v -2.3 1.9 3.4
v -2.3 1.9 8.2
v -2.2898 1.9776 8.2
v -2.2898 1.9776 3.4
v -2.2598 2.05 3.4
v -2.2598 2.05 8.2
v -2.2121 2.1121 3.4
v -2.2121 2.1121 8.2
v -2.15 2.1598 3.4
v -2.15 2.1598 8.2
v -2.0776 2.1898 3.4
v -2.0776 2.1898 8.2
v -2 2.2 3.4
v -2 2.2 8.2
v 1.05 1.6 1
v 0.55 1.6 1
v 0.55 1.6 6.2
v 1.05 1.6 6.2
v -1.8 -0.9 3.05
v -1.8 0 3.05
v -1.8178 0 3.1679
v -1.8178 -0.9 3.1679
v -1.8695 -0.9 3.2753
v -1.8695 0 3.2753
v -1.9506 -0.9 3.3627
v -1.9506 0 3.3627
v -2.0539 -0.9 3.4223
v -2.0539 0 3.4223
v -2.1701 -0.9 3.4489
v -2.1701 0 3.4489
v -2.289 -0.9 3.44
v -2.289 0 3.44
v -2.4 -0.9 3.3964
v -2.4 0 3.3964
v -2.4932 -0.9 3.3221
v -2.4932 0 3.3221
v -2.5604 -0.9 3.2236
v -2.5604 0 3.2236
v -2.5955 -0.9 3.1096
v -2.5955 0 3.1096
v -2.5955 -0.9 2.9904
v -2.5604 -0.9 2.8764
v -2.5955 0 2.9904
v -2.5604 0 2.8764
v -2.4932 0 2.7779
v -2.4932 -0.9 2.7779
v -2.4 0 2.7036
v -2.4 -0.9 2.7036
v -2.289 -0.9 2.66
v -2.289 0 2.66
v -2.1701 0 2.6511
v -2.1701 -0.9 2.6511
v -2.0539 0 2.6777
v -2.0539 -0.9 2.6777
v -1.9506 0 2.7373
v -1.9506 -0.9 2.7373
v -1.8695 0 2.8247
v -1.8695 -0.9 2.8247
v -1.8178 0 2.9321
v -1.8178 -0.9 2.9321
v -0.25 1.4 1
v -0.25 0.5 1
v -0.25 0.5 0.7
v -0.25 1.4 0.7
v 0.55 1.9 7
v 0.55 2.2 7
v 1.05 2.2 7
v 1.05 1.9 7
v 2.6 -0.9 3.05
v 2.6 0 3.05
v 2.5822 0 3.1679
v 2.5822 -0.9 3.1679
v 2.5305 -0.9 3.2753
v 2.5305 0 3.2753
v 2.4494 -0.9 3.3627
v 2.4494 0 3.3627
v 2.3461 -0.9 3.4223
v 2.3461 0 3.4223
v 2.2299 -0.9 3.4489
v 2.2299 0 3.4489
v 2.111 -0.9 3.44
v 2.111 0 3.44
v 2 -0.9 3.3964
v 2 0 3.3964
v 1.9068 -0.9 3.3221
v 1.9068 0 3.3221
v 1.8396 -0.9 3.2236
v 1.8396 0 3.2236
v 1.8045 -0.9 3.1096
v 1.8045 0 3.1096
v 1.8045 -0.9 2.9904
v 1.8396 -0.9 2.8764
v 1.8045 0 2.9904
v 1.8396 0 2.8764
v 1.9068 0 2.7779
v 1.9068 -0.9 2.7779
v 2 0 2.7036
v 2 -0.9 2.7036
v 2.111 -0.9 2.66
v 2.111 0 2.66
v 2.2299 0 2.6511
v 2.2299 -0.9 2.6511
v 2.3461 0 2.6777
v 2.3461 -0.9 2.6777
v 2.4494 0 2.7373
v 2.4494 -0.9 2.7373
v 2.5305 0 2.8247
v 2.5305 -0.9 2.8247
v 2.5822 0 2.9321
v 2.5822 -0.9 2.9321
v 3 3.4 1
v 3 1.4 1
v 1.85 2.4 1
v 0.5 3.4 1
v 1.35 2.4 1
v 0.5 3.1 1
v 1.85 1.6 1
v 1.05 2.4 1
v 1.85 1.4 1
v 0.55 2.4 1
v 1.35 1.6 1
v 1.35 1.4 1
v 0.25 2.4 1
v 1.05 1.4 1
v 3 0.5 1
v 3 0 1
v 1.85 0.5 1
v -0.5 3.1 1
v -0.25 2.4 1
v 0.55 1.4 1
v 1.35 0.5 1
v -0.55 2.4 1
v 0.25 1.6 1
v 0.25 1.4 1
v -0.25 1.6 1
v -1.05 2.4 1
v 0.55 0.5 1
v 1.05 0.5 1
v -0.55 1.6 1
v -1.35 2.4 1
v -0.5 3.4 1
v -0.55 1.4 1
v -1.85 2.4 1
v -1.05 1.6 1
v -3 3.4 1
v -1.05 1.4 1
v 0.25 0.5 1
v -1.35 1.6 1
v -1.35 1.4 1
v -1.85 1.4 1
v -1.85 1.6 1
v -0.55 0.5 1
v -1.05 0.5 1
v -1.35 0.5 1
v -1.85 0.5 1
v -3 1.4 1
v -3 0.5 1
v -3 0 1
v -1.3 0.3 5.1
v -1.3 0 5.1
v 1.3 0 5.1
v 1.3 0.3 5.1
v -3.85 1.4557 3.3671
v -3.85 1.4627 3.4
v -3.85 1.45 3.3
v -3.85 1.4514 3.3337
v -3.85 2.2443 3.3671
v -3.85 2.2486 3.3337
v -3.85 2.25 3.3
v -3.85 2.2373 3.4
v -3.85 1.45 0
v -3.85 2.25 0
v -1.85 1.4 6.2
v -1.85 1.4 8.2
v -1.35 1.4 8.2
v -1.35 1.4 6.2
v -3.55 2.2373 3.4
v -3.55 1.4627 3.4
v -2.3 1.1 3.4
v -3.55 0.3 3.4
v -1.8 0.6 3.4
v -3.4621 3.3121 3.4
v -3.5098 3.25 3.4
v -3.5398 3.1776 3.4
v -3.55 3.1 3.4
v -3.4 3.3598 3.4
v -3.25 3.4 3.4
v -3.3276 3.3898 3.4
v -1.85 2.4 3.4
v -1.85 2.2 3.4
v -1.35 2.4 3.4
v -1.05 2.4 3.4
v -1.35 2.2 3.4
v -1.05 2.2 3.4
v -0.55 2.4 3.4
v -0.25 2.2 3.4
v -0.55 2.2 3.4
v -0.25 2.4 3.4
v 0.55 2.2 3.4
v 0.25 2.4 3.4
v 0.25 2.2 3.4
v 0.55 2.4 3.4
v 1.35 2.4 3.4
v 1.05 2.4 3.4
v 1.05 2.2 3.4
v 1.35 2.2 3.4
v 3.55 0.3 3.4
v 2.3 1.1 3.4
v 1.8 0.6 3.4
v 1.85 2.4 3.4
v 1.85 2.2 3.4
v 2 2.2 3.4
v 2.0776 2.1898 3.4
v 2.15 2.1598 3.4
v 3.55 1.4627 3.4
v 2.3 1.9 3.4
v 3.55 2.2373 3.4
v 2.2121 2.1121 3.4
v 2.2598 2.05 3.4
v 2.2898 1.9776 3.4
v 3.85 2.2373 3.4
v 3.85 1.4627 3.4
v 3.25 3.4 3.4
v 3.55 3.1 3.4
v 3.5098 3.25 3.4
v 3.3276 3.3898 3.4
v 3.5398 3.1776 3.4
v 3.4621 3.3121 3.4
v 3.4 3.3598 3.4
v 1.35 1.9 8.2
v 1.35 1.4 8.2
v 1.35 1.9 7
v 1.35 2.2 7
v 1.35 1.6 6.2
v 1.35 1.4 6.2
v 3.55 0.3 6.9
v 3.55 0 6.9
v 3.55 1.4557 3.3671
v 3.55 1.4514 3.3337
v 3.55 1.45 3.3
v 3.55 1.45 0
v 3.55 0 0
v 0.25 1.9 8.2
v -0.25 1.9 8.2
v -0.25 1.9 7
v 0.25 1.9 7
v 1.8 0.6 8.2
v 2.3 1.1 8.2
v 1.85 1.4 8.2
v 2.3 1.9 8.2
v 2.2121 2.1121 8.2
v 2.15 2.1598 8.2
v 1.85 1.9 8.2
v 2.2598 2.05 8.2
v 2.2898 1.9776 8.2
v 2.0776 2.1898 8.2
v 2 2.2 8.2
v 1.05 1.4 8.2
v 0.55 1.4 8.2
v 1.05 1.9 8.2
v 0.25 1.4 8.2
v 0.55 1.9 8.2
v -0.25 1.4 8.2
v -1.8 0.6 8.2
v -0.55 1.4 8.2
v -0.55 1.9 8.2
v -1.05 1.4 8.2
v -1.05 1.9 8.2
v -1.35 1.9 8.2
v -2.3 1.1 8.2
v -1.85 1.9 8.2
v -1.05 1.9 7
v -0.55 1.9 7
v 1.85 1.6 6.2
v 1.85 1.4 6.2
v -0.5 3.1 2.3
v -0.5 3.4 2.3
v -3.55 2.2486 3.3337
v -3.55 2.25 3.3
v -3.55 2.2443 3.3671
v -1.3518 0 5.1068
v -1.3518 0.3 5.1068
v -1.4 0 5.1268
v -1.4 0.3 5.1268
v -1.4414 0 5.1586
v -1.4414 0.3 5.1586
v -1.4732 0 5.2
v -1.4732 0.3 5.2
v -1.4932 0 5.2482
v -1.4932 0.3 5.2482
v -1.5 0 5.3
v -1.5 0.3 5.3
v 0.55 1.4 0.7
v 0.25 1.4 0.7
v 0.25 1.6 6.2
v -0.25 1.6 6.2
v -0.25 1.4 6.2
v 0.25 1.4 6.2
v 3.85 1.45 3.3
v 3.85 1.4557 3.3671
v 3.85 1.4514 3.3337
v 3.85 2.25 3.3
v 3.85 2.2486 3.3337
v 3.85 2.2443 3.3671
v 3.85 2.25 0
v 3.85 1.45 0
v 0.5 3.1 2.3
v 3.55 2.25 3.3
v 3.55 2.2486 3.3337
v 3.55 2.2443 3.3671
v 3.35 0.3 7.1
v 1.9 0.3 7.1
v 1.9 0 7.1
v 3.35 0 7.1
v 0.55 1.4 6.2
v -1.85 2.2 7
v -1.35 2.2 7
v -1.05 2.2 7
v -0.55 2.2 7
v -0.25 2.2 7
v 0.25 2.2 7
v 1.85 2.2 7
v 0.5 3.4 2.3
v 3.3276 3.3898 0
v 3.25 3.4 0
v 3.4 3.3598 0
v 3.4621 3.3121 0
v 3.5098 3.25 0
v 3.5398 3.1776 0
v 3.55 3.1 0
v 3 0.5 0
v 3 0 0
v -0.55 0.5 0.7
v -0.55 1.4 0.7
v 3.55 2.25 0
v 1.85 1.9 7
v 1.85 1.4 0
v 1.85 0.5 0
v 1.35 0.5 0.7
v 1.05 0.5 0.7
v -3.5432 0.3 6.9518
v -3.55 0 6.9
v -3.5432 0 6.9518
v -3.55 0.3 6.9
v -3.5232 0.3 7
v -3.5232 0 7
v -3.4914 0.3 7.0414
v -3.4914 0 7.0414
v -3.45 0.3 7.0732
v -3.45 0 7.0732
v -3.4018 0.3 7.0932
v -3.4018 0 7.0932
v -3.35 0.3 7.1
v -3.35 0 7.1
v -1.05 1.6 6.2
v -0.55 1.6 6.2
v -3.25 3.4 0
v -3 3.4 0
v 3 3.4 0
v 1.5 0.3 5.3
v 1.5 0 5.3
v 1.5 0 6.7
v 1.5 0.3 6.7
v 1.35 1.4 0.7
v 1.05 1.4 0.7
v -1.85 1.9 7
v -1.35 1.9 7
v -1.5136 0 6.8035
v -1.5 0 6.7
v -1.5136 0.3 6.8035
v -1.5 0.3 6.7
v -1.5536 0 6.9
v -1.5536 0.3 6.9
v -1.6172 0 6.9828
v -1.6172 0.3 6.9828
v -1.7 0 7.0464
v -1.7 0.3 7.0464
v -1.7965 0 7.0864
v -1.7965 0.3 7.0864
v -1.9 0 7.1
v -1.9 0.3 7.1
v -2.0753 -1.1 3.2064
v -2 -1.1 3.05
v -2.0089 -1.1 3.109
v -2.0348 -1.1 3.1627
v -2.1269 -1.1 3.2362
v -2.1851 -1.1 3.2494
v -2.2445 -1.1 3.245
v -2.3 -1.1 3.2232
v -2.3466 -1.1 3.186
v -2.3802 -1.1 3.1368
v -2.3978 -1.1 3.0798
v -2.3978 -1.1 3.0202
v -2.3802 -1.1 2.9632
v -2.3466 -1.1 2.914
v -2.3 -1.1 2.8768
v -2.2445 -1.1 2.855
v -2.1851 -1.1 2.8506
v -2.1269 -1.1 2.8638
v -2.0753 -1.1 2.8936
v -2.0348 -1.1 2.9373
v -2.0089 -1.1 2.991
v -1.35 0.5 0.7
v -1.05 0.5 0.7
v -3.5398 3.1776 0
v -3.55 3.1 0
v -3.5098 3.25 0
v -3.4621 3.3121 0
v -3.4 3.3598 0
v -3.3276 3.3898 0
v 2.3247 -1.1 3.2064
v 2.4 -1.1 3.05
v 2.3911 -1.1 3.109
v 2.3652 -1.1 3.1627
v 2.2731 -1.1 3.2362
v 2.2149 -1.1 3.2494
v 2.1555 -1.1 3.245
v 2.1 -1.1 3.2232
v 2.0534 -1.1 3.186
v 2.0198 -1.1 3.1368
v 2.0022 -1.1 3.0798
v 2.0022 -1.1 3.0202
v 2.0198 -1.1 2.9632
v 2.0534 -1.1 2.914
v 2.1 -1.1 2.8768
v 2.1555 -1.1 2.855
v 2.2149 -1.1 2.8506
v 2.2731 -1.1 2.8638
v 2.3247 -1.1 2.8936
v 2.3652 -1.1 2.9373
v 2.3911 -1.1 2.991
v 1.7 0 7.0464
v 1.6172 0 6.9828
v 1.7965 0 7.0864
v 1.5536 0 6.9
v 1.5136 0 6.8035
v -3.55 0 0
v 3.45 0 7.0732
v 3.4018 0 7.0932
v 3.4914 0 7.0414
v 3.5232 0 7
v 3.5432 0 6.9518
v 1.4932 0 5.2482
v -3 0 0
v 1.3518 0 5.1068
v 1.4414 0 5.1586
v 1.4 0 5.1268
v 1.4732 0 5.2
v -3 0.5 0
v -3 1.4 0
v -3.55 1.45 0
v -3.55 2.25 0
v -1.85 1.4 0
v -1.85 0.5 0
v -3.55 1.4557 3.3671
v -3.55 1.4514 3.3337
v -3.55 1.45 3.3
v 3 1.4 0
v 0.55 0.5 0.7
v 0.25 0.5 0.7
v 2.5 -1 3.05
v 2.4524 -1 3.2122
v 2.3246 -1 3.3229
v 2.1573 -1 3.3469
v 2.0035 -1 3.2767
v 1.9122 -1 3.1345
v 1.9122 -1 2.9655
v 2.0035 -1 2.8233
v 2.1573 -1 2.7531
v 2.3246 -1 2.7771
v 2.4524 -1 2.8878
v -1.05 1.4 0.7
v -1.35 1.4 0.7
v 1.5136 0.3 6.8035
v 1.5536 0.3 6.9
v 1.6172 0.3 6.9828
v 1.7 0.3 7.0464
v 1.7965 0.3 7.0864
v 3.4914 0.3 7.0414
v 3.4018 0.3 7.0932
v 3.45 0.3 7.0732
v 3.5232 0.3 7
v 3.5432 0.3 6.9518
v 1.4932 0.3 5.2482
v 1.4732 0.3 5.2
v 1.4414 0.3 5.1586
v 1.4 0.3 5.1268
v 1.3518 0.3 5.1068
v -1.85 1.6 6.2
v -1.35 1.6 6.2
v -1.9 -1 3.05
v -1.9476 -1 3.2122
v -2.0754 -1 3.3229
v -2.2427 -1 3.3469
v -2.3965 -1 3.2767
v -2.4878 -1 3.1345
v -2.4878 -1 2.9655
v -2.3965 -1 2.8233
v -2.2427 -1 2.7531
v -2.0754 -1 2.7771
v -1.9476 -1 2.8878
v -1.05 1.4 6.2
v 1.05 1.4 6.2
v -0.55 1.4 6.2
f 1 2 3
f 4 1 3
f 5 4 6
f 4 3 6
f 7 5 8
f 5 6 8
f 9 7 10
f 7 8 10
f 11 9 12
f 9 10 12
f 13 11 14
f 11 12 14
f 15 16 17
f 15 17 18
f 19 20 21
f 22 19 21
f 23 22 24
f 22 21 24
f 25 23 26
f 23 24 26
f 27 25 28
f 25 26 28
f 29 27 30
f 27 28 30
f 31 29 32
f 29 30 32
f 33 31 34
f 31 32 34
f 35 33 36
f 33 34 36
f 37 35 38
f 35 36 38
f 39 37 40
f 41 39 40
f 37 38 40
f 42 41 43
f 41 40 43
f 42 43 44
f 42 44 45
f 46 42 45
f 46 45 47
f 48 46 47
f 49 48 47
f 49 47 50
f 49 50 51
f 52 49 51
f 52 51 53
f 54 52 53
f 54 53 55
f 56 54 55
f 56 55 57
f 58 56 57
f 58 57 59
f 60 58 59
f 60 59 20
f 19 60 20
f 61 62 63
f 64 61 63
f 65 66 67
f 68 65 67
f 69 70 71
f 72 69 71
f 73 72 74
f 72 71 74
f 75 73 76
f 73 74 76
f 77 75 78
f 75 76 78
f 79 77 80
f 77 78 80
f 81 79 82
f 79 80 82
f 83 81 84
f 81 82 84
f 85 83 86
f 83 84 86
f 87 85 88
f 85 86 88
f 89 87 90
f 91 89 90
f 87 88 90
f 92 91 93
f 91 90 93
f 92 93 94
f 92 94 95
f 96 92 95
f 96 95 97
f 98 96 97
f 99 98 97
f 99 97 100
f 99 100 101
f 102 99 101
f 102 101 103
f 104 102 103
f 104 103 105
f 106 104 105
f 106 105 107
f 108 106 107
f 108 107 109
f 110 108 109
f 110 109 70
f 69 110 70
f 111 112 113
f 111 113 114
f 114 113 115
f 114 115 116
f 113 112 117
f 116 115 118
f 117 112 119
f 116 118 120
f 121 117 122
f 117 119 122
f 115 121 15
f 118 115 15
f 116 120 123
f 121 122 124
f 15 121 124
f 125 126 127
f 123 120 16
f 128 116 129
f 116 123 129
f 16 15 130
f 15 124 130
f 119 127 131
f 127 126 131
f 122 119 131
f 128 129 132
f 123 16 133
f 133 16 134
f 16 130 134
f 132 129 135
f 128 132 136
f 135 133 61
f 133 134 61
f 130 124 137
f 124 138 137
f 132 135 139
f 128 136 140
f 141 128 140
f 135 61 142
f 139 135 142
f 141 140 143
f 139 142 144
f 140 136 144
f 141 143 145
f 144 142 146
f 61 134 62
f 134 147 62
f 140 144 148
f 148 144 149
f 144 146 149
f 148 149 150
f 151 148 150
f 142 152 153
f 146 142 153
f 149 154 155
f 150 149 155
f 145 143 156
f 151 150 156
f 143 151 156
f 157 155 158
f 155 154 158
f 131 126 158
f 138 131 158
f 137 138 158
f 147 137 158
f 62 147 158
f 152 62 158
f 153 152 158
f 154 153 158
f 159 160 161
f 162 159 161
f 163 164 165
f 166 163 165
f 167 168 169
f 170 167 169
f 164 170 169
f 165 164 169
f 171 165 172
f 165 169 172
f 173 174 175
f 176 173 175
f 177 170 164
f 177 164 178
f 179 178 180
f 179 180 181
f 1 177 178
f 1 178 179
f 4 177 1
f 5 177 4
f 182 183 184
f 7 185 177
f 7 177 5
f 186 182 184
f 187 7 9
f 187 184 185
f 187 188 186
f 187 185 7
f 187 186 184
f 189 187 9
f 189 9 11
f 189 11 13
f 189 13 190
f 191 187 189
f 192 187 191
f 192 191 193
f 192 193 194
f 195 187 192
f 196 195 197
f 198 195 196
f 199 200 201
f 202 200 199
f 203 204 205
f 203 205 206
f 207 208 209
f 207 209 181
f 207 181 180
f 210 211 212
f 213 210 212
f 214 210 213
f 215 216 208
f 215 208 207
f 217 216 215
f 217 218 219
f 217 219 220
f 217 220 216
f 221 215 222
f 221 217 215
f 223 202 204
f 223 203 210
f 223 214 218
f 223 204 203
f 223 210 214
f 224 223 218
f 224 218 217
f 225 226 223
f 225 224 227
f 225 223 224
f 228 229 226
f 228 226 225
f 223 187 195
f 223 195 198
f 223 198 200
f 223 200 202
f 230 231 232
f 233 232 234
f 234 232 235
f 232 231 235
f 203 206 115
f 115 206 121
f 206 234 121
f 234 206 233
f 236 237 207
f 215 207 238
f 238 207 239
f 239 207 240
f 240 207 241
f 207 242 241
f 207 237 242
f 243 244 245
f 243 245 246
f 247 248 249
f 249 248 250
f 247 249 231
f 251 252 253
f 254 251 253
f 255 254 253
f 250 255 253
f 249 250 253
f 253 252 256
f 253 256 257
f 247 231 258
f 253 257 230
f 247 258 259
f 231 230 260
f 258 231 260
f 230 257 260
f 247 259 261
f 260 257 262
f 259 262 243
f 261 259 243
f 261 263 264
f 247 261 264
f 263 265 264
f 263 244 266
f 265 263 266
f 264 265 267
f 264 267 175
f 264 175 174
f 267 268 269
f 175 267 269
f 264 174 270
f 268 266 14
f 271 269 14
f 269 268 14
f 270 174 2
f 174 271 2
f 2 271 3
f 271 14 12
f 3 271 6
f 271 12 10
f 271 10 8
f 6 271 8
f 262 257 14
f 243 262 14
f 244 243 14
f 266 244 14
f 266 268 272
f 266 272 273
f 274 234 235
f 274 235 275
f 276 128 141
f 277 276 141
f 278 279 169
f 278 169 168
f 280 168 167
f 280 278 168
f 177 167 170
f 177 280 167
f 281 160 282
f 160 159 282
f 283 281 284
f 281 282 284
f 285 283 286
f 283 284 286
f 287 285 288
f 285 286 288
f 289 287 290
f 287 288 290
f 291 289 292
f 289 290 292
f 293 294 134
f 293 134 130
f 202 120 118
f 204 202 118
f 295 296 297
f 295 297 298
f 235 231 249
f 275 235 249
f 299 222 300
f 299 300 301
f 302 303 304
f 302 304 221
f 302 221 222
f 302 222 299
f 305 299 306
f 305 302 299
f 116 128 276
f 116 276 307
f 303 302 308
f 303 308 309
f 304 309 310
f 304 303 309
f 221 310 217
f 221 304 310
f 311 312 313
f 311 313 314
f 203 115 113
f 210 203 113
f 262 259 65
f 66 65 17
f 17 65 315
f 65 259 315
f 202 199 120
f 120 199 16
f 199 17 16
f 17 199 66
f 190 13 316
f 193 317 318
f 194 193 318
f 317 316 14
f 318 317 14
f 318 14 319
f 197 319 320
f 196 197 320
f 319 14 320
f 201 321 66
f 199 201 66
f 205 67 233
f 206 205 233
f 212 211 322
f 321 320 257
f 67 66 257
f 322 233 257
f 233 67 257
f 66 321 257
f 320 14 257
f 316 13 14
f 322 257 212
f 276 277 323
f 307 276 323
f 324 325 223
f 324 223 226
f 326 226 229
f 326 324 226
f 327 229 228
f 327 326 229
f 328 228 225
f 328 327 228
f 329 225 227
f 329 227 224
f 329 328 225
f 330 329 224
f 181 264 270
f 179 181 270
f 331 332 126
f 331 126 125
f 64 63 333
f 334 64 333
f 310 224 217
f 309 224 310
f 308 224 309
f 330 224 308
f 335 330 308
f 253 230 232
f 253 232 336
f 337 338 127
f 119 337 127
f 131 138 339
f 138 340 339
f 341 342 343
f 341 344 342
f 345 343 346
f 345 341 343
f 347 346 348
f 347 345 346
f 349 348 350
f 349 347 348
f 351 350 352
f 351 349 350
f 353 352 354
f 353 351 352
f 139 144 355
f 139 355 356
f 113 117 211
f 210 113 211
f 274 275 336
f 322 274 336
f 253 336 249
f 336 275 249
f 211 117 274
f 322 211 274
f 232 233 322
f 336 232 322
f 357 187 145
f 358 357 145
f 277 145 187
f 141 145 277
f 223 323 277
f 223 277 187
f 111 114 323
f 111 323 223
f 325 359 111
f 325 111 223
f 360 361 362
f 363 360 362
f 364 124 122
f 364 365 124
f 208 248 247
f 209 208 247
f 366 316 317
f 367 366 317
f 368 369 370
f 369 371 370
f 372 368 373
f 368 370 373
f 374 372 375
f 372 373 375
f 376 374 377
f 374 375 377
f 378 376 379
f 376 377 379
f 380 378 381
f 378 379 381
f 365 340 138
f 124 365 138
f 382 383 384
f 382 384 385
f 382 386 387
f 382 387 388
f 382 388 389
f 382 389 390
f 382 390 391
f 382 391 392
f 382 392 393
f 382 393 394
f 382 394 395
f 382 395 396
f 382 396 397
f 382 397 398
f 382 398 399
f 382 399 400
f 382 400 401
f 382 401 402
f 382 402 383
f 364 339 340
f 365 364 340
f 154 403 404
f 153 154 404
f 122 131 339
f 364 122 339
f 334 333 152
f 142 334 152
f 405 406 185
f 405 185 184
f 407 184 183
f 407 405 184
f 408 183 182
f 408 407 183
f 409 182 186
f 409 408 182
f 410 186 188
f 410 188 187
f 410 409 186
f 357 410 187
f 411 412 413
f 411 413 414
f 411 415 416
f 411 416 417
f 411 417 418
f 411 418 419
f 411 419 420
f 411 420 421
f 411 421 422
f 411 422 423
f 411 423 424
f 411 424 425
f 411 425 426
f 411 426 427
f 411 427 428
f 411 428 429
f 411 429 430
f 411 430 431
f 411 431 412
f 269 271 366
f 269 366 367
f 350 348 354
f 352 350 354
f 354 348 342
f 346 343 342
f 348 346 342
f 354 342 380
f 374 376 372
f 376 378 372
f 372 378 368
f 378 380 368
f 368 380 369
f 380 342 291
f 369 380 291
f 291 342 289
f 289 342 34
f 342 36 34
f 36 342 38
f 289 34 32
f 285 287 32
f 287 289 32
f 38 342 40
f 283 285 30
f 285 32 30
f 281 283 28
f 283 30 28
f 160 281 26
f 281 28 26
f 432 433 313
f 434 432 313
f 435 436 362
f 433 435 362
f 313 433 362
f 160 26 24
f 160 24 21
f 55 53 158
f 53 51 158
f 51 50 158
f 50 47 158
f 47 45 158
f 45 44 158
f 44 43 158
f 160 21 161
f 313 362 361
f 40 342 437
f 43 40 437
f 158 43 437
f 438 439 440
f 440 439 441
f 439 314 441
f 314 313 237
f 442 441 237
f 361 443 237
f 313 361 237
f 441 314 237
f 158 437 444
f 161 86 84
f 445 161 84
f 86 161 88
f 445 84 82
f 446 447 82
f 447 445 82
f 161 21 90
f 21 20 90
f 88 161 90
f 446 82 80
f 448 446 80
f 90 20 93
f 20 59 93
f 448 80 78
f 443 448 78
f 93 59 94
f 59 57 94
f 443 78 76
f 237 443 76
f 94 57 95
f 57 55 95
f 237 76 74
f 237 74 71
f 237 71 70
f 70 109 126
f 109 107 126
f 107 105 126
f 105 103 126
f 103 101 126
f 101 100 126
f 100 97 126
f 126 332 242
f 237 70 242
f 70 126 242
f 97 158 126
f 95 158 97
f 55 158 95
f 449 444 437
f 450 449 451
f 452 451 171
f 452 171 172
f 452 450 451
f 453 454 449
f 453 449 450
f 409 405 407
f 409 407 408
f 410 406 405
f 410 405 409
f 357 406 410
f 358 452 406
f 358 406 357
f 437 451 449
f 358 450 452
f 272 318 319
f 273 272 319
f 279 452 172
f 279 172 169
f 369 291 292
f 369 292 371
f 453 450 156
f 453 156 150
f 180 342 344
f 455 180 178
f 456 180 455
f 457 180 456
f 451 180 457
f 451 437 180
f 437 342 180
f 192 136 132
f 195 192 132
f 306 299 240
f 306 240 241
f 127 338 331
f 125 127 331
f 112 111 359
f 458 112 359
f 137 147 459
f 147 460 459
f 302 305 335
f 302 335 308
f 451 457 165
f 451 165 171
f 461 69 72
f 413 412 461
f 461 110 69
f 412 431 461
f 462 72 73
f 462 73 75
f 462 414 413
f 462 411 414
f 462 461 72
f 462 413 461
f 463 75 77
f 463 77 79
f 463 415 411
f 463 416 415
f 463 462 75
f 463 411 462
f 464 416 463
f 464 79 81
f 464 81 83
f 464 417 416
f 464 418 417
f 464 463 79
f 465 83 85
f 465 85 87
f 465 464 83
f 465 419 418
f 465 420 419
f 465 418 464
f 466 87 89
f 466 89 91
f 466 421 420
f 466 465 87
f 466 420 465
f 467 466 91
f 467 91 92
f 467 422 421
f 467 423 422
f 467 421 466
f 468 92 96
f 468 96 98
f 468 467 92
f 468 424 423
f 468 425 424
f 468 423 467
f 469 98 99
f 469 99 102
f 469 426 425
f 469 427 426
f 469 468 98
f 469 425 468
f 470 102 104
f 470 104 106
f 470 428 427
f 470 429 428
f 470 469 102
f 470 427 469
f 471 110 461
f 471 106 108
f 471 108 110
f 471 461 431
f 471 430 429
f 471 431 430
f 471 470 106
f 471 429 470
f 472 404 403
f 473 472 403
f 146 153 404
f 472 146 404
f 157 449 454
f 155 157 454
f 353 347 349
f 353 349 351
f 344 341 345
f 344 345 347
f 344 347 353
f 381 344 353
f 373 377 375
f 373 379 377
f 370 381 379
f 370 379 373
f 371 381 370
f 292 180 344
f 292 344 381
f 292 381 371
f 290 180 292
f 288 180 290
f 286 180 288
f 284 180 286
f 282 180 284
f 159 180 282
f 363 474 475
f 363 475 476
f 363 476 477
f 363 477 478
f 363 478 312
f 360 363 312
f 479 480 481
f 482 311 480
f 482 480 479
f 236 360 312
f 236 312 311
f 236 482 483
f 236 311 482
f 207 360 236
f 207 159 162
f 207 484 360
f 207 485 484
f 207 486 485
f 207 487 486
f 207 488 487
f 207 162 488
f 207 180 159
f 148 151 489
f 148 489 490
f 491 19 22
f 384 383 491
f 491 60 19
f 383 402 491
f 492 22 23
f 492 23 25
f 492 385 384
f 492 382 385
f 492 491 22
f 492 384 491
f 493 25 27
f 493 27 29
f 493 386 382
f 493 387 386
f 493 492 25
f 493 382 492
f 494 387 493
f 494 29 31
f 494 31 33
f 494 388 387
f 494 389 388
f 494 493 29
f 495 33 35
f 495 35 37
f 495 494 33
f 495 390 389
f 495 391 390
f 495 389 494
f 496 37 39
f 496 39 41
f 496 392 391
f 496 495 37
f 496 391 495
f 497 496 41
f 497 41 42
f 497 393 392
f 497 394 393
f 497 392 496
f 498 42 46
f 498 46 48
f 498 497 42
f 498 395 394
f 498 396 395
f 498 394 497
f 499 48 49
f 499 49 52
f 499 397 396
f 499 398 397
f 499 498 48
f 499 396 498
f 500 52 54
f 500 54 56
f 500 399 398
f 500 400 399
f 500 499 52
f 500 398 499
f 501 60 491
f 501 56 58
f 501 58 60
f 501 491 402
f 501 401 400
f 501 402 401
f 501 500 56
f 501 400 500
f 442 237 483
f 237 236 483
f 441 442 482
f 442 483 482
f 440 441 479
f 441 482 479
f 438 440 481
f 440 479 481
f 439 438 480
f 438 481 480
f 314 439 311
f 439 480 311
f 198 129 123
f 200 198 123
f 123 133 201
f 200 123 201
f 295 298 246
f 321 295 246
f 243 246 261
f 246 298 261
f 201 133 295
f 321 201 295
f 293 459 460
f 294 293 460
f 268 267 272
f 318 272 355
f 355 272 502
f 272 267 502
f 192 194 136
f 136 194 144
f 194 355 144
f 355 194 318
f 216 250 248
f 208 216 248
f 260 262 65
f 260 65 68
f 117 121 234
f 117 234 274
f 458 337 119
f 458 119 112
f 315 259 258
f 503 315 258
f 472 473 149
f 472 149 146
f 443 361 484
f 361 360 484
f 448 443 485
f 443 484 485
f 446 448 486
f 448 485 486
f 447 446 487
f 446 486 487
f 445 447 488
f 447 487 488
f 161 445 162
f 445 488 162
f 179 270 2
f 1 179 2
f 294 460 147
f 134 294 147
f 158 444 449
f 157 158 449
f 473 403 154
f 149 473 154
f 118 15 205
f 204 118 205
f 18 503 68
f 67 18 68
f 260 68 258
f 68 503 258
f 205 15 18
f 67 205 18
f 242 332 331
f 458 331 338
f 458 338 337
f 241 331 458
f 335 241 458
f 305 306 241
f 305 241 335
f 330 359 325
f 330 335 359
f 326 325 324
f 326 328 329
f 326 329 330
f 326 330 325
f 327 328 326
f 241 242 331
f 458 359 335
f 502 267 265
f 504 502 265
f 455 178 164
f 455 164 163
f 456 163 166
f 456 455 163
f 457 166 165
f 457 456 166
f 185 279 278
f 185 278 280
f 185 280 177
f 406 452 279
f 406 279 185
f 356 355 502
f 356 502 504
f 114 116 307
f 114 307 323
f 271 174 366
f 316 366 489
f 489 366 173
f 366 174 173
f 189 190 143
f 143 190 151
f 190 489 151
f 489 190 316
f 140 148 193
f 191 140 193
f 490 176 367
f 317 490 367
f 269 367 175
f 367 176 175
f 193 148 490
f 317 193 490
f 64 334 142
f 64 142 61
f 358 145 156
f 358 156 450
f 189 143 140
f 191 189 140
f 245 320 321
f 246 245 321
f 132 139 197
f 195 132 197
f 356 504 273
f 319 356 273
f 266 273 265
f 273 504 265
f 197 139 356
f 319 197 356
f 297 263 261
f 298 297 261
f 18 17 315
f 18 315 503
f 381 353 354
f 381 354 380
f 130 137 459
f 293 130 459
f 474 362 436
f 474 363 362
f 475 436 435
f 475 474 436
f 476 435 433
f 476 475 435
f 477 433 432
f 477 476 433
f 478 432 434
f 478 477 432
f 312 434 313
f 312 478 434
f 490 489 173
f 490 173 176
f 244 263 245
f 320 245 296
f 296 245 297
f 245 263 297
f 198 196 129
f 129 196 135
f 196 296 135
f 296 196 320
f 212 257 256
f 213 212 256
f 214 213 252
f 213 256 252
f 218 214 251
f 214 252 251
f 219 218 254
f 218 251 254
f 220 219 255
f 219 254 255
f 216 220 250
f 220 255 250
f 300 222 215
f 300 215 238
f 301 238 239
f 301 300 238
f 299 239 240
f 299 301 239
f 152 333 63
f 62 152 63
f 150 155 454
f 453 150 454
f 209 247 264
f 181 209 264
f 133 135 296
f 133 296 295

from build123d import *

# Parameters (mm, degrees)
BOSS_EXTRUDE1_DEPTH = 8.2
BOSS_EXTRUDE2_DEPTH = 3.85
SKETCH3_OUTSIDE_W   = 12.05
SKETCH3_OUTSIDE_H   = 7.75
CUT_EXTRUDE1_DEPTH  = 4.8
SKETCH4_W           = 1
SKETCH4_H           = 0.3
CUT_EXTRUDE3_DEPTH  = 2.3
CUT_EXTRUDE6_DEPTH  = 4.4
SKETCH6_W           = 0.5
SKETCH6_H           = 0.5
CUT_EXTRUDE7_DEPTH  = 2
SKETCH7_W           = 0.5
SKETCH7_H           = 0.8
CUT_EXTRUDE8_DEPTH  = 7
SKETCH8_W           = 6
SKETCH8_H           = 1
CUT_EXTRUDE9_DEPTH  = 2
SKETCH9_W           = 6
SKETCH9_H           = 0.5
CUT_EXTRUDE10_DEPTH = 1
SKETCH10_R          = 0.4
BOSS_EXTRUDE3_DEPTH = 1.1
CHAMFER1_SIZE       = 0.2
SKETCH11_W          = 7.1
SKETCH11_H          = 0.3
BOSS_EXTRUDE4_DEPTH = 3.7
FILLET1_R           = 0.2
SKETCH12_W          = 3
SKETCH12_H          = 2
CUT_EXTRUDE11_DEPTH = 0.5
FILLET2_R           = 0.2
FILLET3_R           = 0.4


with BuildPart() as part:
    # Sketch1 → Boss-Extrude1 (new body)
    with BuildSketch(Plane.XY):
        with BuildLine():
            Line((-3.25, 3.4), (3.25, 3.4))
            ThreePointArc((3.25, 3.4), (3.462132034, 3.312132034), (3.55, 3.1))
            Line((3.55, 3.1), (3.55, 0))
            Line((3.55, 0), (-3.55, 0))
            Line((-3.55, 0), (-3.55, 3.1))
            ThreePointArc((-3.55, 3.1), (-3.462132034, 3.312132034), (-3.25, 3.4))
        make_face()
    extrude(amount=BOSS_EXTRUDE1_DEPTH)

    # Sketch2 → Boss-Extrude2 (add, symmetric)
    with BuildSketch(Plane(origin=(0, 0, 0), x_dir=(0, 0, -1), z_dir=(1, 0, 0))):
        with BuildLine():
            Line((0, 2.25), (-3.3, 2.25))
            ThreePointArc((-3.3, 2.25), (-3.7, 1.85), (-3.3, 1.45))
            Line((-3.3, 1.45), (0, 1.45))
            Line((0, 1.45), (0, 2.25))
        make_face()
    extrude(amount=BOSS_EXTRUDE2_DEPTH, both=True)

    # Sketch3 outside → Cut-Extrude1 (cut)
    with BuildSketch(Plane.XY.offset(8.2)):
        with Locations((0, 1.7)):
            Rectangle(SKETCH3_OUTSIDE_W, SKETCH3_OUTSIDE_H)
        with BuildLine():
            Line((-2, 2.2), (2, 2.2))
            ThreePointArc((2, 2.2), (2.212132034, 2.112132034), (2.3, 1.9))
            Line((2.3, 1.9), (2.3, 1.1))
            Line((2.3, 1.1), (1.8, 0.6))
            Line((1.8, 0.6), (-1.8, 0.6))
            Line((-1.8, 0.6), (-2.3, 1.1))
            Line((-2.3, 1.1), (-2.3, 1.9))
            ThreePointArc((-2.3, 1.9), (-2.212132034, 2.112132034), (-2, 2.2))
        make_face(mode=Mode.SUBTRACT)
    extrude(amount=-CUT_EXTRUDE1_DEPTH, mode=Mode.SUBTRACT)

    # Sketch4 → Cut-Extrude3 (cut)
    with BuildSketch(Plane.XY):
        with Locations((0, 3.25)):
            Rectangle(SKETCH4_W, SKETCH4_H)
    extrude(amount=CUT_EXTRUDE3_DEPTH, mode=Mode.SUBTRACT)

    # Sketch5 → Cut-Extrude6 (cut, through all)
    with BuildSketch(Plane(origin=(0, 0, 0), x_dir=(1, 0, 0), z_dir=(0, 1, 0))):
        Polygon((-1.85, 0), (1.85, 0), (1.85, -1), (1.35, -1), (1.35, -0.7), (1.05, -0.7), (1.05, -1), (0.55, -1), (0.55, -0.7), (0.25, -0.7), (0.25, -1), (-0.25, -1), (-0.25, -0.7), (-0.55, -0.7), (-0.55, -1), (-1.05, -1), (-1.05, -0.7), (-1.35, -0.7), (-1.35, -1), (-1.85, -1), align=None)
    extrude(amount=CUT_EXTRUDE6_DEPTH, mode=Mode.SUBTRACT)

    # Sketch6 → Cut-Extrude7 (cut)
    with BuildSketch(Plane.XY.offset(8.2)):
        with Locations((1.6, 1.65)):
            Rectangle(SKETCH6_W, SKETCH6_H)
        with Locations((0.8, 1.65)):
            Rectangle(SKETCH6_W, SKETCH6_H)
        with Locations((0, 1.65)):
            Rectangle(SKETCH6_W, SKETCH6_H)
        with Locations((-0.8, 1.65)):
            Rectangle(SKETCH6_W, SKETCH6_H)
        with Locations((-1.6, 1.65)):
            Rectangle(SKETCH6_W, SKETCH6_H)
    extrude(amount=-CUT_EXTRUDE7_DEPTH, mode=Mode.SUBTRACT)

    # Sketch7 → Cut-Extrude8 (cut)
    with BuildSketch(Plane.XY):
        with Locations((1.6, 2)):
            Rectangle(SKETCH7_W, SKETCH7_H)
        with Locations((0.8, 2)):
            Rectangle(SKETCH7_W, SKETCH7_H)
        with Locations((0, 2)):
            Rectangle(SKETCH7_W, SKETCH7_H)
        with Locations((-0.8, 2)):
            Rectangle(SKETCH7_W, SKETCH7_H)
        with Locations((-1.6, 2)):
            Rectangle(SKETCH7_W, SKETCH7_H)
    extrude(amount=CUT_EXTRUDE8_DEPTH, mode=Mode.SUBTRACT)

    # Sketch8 → Cut-Extrude9 (cut)
    with BuildSketch(Plane(origin=(0, 3.4, 0), x_dir=(1, 0, 0), z_dir=(0, 1, 0))):
        with Locations((0, -0.5)):
            Rectangle(SKETCH8_W, SKETCH8_H)
    extrude(amount=-CUT_EXTRUDE9_DEPTH, mode=Mode.SUBTRACT)

    # Sketch9 → Cut-Extrude10 (cut)
    with BuildSketch(Plane.XY):
        with Locations((0, 0.25)):
            Rectangle(SKETCH9_W, SKETCH9_H)
    extrude(amount=CUT_EXTRUDE10_DEPTH, mode=Mode.SUBTRACT)

    # Sketch10 → Boss-Extrude3 (add)
    with BuildSketch(Plane.XZ):
        with Locations((2.2, 3.05)):
            Circle(SKETCH10_R)
        with Locations((-2.2, 3.05)):
            Circle(SKETCH10_R)
    extrude(amount=BOSS_EXTRUDE3_DEPTH)

    # Chamfer1
    chamfer1_edges = [part.edges().sort_by_distance(p)[0] for p in [
        (1.8, -1.1, 3.05),
        (-2.6, -1.1, 3.05),
    ]]
    chamfer(chamfer1_edges, length=CHAMFER1_SIZE)

    # Sketch11 → Boss-Extrude4 (add)
    with BuildSketch(Plane.XY.offset(3.4)):
        with Locations((0, 0.15)):
            Rectangle(SKETCH11_W, SKETCH11_H)
    extrude(amount=BOSS_EXTRUDE4_DEPTH)

    # Fillet1
    fillet1_edges = [part.edges().sort_by_distance(p)[0] for p in [
        (-3.55, 0.15, 7.1),
        (3.55, 0.15, 7.1),
    ]]
    fillet(fillet1_edges, radius=FILLET1_R)

    # Sketch12 → Cut-Extrude11 (cut)
    with BuildSketch(Plane.XZ):
        with Locations((0, 6.1)):
            Rectangle(SKETCH12_W, SKETCH12_H)
    extrude(amount=-CUT_EXTRUDE11_DEPTH, mode=Mode.SUBTRACT)

    # Fillet2
    fillet2_edges = [part.edges().sort_by_distance(p)[0] for p in [
        (1.5, 0.15, 5.1),
        (-1.5, 0.15, 5.1),
    ]]
    fillet(fillet2_edges, radius=FILLET2_R)

    # Fillet3
    fillet3_edges = [part.edges().sort_by_distance(p)[0] for p in [
        (1.5, 0.15, 7.1),
        (-1.5, 0.15, 7.1),
    ]]
    fillet(fillet3_edges, radius=FILLET3_R)


solid = part.part
